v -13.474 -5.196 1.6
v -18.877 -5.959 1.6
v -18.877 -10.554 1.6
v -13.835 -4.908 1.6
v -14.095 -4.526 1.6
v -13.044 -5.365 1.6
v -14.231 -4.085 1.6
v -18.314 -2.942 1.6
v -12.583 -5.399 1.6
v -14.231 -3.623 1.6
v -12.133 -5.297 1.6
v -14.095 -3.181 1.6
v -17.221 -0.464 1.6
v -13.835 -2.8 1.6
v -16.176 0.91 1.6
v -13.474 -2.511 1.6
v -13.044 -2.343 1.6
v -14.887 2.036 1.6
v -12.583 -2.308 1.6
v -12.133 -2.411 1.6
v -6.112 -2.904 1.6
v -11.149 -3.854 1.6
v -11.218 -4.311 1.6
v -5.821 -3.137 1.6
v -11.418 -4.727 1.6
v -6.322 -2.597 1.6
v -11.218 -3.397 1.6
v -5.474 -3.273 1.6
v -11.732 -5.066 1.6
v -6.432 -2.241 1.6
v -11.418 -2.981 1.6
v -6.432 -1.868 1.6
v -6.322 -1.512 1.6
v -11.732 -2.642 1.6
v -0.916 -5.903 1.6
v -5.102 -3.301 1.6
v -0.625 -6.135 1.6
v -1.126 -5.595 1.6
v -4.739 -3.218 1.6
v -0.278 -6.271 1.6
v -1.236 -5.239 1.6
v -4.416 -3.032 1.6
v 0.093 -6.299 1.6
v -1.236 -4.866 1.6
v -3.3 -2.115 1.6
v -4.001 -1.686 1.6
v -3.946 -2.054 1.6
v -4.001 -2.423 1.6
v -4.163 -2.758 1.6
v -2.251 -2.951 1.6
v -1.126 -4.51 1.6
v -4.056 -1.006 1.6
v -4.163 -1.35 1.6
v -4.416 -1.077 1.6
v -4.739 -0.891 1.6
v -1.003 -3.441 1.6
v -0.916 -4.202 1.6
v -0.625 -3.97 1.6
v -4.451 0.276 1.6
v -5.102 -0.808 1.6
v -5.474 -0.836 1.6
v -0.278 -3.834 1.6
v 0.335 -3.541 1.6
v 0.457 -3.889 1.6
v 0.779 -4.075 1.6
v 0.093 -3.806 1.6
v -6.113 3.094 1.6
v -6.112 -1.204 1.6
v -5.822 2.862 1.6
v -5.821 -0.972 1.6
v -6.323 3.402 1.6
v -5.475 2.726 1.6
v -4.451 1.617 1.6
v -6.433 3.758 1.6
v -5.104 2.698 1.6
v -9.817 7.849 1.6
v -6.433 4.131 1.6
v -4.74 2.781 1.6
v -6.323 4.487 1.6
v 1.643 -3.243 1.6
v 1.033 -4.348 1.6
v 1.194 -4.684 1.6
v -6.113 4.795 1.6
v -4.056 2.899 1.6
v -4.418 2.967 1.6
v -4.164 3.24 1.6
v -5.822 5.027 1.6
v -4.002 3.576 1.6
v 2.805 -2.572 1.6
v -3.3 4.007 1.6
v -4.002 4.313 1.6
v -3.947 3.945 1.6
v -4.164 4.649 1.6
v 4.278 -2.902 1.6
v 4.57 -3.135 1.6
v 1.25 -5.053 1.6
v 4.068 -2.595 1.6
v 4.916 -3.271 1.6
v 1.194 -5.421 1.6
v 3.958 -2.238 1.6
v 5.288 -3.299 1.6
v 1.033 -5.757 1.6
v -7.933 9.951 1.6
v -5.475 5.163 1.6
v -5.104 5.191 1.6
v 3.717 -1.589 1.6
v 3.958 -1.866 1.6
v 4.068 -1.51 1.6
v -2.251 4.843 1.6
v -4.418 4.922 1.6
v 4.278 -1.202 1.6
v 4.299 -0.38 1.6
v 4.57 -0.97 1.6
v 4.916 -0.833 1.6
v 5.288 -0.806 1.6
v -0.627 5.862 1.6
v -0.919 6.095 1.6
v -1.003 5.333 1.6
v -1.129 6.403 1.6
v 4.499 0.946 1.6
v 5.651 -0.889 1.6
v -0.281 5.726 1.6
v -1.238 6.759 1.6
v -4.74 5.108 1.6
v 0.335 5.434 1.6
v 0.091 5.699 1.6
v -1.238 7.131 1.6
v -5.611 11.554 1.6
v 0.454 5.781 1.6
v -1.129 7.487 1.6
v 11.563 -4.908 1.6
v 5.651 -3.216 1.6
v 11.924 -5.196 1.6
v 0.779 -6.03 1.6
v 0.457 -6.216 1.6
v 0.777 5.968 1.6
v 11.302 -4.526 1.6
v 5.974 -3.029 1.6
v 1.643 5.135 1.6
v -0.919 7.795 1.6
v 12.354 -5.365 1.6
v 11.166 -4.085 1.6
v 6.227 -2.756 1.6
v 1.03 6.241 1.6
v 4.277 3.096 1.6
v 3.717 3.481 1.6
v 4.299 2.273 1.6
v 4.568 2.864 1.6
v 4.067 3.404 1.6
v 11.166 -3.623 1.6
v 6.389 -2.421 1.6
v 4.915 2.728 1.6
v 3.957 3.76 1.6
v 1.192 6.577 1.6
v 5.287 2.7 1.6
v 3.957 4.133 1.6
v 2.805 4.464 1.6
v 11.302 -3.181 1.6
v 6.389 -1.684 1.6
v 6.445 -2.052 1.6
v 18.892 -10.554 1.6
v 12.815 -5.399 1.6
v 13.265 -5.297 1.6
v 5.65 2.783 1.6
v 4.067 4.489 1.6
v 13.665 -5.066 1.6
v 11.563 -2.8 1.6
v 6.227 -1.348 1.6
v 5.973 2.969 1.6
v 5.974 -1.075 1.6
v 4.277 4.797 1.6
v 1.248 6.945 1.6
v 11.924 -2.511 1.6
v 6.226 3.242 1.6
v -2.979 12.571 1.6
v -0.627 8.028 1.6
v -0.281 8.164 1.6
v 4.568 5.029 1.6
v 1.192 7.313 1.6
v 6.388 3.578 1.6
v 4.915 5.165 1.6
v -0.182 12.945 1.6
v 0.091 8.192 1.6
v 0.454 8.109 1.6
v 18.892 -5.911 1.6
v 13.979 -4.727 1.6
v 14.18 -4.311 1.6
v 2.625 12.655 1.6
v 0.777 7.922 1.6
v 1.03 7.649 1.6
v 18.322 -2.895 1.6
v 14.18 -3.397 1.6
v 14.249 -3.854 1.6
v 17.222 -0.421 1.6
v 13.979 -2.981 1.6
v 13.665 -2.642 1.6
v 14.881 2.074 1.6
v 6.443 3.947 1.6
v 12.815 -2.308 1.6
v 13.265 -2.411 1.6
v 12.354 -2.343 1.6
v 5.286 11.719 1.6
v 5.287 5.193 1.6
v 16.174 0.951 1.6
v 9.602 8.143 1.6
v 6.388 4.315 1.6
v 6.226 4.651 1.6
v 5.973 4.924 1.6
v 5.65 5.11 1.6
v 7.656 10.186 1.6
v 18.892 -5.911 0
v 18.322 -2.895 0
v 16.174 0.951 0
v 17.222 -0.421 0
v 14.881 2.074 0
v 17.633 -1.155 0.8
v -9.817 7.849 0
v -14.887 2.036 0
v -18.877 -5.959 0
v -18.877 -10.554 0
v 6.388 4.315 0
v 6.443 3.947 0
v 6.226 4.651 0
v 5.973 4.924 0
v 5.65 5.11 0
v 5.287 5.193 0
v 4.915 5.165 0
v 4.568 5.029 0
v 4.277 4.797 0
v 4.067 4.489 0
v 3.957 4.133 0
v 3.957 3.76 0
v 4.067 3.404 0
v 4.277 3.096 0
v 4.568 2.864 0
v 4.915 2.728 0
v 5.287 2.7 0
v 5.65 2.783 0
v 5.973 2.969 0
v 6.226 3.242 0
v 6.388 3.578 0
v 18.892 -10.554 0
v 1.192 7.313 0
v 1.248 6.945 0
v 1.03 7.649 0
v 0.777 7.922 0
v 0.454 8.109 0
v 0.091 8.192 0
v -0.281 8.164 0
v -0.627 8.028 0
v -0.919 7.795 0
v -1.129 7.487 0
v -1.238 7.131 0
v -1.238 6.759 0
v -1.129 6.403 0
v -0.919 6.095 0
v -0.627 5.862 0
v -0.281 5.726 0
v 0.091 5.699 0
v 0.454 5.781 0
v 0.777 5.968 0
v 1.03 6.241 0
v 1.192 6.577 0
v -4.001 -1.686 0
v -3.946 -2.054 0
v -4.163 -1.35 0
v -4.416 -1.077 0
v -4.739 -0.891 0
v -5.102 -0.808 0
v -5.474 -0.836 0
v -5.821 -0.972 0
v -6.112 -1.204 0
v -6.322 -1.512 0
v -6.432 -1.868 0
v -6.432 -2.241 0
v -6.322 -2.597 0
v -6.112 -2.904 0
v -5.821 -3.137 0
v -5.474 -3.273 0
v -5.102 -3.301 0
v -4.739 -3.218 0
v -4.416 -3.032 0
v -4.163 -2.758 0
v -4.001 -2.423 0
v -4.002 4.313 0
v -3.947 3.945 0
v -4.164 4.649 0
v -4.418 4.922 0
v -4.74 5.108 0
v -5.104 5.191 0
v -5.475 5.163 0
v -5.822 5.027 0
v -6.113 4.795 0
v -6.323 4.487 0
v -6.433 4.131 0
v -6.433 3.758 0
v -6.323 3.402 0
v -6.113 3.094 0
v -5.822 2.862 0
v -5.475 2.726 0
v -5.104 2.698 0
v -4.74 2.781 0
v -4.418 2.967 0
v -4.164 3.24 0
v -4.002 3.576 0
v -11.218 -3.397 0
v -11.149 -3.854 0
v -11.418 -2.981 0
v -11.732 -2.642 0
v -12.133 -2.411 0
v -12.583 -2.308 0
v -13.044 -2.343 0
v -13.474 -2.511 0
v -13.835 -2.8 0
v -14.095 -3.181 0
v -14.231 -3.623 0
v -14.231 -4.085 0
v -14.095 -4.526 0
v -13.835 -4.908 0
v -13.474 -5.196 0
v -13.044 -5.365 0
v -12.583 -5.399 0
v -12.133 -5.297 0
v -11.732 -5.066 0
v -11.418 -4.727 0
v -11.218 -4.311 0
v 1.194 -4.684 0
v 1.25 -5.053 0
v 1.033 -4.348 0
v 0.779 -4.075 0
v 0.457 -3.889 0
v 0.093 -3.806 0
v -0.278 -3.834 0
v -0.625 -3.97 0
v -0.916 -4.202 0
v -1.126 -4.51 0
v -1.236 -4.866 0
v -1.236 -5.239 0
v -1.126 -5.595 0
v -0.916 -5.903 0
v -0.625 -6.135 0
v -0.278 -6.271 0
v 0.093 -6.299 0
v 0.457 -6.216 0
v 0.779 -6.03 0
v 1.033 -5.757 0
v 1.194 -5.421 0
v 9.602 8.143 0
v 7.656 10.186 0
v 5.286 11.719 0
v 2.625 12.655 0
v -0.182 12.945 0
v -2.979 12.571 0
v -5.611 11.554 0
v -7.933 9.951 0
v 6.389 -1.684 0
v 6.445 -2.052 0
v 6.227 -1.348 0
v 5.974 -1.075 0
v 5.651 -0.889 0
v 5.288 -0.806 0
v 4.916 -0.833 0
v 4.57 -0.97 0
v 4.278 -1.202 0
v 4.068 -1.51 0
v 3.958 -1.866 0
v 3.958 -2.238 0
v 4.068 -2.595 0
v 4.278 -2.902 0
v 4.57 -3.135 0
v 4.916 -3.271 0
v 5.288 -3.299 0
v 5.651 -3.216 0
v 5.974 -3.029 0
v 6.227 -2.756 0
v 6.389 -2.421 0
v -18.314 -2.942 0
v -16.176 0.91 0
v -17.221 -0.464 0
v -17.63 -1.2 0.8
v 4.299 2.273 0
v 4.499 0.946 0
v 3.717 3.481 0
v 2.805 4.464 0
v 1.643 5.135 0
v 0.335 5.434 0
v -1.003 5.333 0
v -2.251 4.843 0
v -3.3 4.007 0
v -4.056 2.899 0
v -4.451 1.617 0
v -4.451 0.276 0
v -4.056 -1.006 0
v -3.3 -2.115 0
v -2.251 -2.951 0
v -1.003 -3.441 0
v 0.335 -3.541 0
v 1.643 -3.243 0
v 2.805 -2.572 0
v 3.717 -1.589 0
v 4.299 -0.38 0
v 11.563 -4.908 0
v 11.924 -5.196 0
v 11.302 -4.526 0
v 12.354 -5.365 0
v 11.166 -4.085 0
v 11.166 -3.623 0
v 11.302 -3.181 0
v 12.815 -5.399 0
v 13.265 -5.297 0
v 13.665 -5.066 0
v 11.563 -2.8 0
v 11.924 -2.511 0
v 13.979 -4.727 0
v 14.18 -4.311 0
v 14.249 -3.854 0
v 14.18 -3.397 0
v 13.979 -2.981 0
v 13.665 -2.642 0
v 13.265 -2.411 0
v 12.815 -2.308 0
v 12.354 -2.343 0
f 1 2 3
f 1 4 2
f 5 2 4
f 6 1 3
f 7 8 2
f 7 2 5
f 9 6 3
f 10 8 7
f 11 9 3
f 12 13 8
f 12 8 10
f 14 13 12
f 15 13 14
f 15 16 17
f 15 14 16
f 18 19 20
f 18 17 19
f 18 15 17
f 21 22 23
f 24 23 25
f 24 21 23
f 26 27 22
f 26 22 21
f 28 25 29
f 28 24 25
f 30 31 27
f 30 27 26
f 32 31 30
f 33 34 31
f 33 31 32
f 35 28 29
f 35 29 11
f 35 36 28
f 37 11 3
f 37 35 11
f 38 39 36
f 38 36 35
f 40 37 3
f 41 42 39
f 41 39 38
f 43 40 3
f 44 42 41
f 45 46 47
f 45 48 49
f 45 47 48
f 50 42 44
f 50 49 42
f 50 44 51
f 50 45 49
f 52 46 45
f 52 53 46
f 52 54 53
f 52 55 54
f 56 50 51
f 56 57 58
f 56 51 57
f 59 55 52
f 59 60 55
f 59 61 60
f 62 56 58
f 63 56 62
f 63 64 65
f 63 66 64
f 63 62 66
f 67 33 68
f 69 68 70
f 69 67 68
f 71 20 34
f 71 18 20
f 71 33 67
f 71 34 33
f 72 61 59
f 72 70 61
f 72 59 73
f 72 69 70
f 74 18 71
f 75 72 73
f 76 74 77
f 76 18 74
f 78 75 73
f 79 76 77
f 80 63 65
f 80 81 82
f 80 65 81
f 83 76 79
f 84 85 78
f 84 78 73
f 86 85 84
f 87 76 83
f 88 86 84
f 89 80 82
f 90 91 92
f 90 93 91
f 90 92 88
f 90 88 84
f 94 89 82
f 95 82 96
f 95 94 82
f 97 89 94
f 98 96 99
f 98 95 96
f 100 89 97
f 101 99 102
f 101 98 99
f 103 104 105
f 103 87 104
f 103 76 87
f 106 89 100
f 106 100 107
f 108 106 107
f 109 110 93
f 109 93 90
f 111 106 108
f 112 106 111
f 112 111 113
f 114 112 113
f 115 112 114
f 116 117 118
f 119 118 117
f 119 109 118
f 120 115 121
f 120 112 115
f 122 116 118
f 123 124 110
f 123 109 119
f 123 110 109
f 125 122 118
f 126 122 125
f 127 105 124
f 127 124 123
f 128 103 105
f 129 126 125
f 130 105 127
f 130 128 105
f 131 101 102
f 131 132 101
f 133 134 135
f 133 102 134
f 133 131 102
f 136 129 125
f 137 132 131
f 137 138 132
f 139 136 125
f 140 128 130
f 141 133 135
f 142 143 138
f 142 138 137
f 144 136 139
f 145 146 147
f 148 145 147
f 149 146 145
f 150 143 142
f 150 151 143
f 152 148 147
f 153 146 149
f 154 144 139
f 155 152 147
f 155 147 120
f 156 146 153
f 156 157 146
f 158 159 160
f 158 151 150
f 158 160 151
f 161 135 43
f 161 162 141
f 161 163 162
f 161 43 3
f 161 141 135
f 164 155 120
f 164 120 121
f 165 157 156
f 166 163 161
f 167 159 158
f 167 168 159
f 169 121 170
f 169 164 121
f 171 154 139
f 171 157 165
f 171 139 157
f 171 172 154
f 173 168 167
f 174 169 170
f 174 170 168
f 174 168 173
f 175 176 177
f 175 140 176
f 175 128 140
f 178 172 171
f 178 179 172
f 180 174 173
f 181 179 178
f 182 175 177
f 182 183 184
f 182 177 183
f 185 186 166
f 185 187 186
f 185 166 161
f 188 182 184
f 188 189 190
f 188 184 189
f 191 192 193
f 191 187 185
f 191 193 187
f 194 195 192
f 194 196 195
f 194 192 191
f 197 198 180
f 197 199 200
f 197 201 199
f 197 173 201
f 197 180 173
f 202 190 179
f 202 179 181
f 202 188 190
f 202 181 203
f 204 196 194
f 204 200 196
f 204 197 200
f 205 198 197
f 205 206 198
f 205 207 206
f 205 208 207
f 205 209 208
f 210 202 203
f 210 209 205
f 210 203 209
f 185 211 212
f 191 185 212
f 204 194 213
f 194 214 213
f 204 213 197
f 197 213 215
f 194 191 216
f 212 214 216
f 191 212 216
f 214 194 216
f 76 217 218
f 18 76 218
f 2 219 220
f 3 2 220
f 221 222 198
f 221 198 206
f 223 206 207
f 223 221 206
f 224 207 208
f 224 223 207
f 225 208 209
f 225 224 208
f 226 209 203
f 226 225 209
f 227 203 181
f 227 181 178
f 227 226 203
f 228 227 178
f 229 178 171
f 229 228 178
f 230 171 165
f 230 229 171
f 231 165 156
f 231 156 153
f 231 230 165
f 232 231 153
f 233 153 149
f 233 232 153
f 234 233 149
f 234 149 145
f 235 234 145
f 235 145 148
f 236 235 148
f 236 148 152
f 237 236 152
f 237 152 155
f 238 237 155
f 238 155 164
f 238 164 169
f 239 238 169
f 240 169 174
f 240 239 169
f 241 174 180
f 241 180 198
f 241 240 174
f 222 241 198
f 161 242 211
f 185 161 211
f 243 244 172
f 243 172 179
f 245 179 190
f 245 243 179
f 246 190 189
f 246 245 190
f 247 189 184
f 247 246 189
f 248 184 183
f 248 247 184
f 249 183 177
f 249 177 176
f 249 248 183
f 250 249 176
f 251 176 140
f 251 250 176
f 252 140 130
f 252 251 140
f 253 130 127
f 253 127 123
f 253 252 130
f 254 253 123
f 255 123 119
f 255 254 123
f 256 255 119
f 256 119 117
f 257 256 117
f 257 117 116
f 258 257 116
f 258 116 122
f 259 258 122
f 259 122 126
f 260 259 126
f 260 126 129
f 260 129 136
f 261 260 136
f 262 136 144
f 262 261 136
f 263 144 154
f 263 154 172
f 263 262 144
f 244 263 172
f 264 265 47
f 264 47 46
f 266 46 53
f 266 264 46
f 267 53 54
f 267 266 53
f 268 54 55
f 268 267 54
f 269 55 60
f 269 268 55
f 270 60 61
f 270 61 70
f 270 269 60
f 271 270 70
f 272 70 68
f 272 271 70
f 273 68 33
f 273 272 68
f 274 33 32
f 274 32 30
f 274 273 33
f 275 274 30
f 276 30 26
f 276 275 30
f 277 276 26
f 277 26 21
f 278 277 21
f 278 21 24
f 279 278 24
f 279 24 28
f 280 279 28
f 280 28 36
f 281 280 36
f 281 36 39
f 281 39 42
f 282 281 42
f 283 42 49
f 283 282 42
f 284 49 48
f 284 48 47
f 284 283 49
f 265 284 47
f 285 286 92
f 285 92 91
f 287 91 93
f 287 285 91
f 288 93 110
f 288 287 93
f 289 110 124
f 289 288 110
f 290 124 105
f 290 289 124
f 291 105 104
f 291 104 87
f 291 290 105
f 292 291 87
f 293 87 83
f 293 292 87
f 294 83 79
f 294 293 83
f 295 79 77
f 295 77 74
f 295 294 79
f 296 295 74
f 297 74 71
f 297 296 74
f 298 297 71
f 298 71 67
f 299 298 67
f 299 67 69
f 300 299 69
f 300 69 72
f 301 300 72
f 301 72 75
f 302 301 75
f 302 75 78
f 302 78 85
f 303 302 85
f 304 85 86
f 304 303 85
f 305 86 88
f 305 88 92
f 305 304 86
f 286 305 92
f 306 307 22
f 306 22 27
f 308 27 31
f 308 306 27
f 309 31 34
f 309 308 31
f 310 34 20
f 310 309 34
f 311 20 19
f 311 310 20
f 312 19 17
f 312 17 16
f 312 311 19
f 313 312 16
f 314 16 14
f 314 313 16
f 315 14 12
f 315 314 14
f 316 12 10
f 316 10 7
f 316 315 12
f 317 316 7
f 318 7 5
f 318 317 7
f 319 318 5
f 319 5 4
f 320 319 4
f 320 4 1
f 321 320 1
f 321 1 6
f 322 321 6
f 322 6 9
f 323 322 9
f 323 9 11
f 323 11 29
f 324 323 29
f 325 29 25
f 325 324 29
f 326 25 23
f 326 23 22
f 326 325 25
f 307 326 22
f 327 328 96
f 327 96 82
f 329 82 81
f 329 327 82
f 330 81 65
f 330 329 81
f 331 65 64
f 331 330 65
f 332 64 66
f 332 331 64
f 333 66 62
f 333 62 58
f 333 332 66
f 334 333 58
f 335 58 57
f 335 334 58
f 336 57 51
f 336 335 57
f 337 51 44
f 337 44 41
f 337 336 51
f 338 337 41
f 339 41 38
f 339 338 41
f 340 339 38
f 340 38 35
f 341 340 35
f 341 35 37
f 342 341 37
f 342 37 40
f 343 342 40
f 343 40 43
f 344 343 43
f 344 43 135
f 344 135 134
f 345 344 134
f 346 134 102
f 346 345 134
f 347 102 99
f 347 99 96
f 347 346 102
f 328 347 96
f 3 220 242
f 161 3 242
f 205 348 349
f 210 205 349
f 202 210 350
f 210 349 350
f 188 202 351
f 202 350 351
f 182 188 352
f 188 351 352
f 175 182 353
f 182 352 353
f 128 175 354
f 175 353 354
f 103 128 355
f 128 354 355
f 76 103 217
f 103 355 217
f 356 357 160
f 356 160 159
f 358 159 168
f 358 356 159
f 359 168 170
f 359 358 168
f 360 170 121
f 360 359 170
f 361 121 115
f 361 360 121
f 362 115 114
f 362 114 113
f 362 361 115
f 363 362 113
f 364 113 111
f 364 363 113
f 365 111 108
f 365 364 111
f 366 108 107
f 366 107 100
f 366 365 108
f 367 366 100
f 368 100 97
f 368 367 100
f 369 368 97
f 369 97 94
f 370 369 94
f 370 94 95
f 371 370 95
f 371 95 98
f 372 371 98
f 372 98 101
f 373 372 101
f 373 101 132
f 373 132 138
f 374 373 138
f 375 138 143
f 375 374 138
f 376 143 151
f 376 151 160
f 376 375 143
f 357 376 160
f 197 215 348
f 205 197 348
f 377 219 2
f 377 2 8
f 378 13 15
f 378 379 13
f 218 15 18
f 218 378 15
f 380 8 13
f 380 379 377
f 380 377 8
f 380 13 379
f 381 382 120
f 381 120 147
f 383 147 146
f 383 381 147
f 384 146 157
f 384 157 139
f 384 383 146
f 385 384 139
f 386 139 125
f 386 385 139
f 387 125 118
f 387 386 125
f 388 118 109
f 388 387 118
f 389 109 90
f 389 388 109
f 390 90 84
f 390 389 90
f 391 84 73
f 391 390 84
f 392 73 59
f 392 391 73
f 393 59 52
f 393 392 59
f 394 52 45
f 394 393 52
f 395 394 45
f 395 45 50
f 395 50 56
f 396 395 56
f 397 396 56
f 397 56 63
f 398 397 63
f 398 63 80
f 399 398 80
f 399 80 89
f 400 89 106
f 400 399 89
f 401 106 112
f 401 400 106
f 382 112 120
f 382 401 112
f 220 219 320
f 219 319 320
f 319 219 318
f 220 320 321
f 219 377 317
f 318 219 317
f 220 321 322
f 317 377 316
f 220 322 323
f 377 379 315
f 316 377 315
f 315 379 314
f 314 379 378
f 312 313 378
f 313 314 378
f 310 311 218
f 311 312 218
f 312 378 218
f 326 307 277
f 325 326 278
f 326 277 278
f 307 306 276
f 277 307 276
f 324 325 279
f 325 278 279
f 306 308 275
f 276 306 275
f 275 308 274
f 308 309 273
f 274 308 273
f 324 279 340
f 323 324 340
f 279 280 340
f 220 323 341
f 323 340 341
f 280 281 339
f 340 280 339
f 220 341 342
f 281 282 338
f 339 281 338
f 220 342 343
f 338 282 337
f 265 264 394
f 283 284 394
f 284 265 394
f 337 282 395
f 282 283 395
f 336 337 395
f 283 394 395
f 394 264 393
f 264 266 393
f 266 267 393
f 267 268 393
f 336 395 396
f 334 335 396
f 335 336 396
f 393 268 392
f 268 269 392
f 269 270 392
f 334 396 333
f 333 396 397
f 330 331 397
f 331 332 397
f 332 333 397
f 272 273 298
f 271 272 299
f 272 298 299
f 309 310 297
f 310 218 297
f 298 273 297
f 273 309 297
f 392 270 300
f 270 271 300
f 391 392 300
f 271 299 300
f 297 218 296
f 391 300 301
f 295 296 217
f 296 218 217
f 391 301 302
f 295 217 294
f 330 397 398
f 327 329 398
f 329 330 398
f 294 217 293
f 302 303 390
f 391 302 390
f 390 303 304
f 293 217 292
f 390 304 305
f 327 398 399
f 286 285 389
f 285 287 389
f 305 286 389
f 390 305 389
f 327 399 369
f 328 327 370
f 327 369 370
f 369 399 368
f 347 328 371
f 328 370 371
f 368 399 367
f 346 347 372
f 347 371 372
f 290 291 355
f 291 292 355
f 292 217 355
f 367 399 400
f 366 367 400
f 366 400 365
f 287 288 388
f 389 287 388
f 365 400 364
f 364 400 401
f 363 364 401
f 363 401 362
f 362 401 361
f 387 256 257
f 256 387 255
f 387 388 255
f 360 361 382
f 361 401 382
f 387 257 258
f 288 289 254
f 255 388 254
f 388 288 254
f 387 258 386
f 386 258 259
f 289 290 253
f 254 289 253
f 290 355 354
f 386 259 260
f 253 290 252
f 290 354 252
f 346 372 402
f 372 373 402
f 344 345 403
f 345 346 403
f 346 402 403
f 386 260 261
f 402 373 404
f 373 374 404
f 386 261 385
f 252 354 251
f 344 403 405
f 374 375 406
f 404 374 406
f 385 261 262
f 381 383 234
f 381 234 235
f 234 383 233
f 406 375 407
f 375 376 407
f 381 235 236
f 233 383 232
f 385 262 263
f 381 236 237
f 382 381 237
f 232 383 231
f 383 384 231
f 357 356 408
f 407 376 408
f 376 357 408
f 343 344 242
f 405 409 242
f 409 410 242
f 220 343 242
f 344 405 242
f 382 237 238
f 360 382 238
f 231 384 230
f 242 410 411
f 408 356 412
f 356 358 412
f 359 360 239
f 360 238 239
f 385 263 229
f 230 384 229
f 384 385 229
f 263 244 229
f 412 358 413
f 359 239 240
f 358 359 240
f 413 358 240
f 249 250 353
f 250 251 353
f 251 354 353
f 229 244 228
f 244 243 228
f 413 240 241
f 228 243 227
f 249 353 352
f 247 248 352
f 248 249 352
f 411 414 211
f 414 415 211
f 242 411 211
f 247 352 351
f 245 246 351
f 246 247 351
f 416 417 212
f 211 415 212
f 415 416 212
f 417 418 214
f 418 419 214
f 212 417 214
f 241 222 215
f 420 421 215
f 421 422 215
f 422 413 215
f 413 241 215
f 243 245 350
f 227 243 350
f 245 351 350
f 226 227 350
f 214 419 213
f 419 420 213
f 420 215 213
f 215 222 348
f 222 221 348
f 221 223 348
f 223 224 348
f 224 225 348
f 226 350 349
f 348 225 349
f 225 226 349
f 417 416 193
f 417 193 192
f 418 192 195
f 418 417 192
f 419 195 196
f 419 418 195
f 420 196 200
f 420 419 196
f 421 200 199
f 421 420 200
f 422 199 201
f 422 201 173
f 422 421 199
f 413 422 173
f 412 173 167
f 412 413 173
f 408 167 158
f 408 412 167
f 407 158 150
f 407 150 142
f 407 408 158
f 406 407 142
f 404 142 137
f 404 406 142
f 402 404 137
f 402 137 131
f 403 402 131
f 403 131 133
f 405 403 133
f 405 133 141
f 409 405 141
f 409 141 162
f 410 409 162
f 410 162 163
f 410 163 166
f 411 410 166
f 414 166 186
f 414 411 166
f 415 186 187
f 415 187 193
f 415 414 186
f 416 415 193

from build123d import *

# Parameters (mm, degrees)
CROQUIS1_R              = 4.5
CROQUIS1_R_2            = 1.249999997
CROQUIS1_R_3            = 1.25
CROQUIS1_R_4            = 1.250000007
CROQUIS1_R_5            = 1.55
SALIENTE_EXTRUIR1_DEPTH = 1.6


with BuildPart() as part:
    # Croquis1 → Saliente-Extruir1 (new body)
    with BuildSketch(Plane.XY):
        with BuildLine():
            Line((-18.876999997, -10.553790007), (18.892053472, -10.553790007))
            Line((18.892053472, -10.553790007), (18.892053472, -5.910945686))
            add(Edge.make_bspline(
                [(18.892053472, -5.910945686), (18.378347588, -0.392416566), (14.881416045, 2.073879198)],
                knots=[0, 0, 0, 0.734097382, 0.734097382, 0.734097382], degree=2))
            Line((14.881416045, 2.073879198), (9.601527182, 8.142540641))
            ThreePointArc((9.601527182, 8.142540641), (-0.182204471, 12.944844806), (-9.816792732, 7.849407753))
            Line((-9.816792732, 7.849407753), (-14.886628426, 2.036126845))
            add(Edge.make_bspline(
                [(-18.876999997, -5.958845057), (-18.377293132, -0.43903071), (-14.886628426, 2.036126845)],
                knots=[0, 0, 0, 0.734097382, 0.734097382, 0.734097382], degree=2))
            Line((-18.876999997, -5.958845057), (-18.876999997, -10.553790007))
        make_face()
        with Locations((-0.0012, 0.946209993)):
            Circle(CROQUIS1_R, mode=Mode.SUBTRACT)
        with Locations((-0.0024, 6.945010003)):
            Circle(CROQUIS1_R_2, mode=Mode.SUBTRACT)
        with Locations((5.193313192, 3.946649223)):
            Circle(CROQUIS1_R_3, mode=Mode.SUBTRACT)
        with Locations((5.194513192, -2.052150777)):
            Circle(CROQUIS1_R_3, mode=Mode.SUBTRACT)
        with Locations((0, -5.052590007)):
            Circle(CROQUIS1_R_3, mode=Mode.SUBTRACT)
        with Locations((-5.195713192, -2.054229238)):
            Circle(CROQUIS1_R_3, mode=Mode.SUBTRACT)
        with Locations((-5.196913248, 3.944570795)):
            Circle(CROQUIS1_R_4, mode=Mode.SUBTRACT)
        with Locations((12.6988, -3.853790007)):
            Circle(CROQUIS1_R_5, mode=Mode.SUBTRACT)
        with Locations((-12.6988, -3.853790007)):
            Circle(CROQUIS1_R_5, mode=Mode.SUBTRACT)
    extrude(amount=SALIENTE_EXTRUIR1_DEPTH)


solid = part.part
